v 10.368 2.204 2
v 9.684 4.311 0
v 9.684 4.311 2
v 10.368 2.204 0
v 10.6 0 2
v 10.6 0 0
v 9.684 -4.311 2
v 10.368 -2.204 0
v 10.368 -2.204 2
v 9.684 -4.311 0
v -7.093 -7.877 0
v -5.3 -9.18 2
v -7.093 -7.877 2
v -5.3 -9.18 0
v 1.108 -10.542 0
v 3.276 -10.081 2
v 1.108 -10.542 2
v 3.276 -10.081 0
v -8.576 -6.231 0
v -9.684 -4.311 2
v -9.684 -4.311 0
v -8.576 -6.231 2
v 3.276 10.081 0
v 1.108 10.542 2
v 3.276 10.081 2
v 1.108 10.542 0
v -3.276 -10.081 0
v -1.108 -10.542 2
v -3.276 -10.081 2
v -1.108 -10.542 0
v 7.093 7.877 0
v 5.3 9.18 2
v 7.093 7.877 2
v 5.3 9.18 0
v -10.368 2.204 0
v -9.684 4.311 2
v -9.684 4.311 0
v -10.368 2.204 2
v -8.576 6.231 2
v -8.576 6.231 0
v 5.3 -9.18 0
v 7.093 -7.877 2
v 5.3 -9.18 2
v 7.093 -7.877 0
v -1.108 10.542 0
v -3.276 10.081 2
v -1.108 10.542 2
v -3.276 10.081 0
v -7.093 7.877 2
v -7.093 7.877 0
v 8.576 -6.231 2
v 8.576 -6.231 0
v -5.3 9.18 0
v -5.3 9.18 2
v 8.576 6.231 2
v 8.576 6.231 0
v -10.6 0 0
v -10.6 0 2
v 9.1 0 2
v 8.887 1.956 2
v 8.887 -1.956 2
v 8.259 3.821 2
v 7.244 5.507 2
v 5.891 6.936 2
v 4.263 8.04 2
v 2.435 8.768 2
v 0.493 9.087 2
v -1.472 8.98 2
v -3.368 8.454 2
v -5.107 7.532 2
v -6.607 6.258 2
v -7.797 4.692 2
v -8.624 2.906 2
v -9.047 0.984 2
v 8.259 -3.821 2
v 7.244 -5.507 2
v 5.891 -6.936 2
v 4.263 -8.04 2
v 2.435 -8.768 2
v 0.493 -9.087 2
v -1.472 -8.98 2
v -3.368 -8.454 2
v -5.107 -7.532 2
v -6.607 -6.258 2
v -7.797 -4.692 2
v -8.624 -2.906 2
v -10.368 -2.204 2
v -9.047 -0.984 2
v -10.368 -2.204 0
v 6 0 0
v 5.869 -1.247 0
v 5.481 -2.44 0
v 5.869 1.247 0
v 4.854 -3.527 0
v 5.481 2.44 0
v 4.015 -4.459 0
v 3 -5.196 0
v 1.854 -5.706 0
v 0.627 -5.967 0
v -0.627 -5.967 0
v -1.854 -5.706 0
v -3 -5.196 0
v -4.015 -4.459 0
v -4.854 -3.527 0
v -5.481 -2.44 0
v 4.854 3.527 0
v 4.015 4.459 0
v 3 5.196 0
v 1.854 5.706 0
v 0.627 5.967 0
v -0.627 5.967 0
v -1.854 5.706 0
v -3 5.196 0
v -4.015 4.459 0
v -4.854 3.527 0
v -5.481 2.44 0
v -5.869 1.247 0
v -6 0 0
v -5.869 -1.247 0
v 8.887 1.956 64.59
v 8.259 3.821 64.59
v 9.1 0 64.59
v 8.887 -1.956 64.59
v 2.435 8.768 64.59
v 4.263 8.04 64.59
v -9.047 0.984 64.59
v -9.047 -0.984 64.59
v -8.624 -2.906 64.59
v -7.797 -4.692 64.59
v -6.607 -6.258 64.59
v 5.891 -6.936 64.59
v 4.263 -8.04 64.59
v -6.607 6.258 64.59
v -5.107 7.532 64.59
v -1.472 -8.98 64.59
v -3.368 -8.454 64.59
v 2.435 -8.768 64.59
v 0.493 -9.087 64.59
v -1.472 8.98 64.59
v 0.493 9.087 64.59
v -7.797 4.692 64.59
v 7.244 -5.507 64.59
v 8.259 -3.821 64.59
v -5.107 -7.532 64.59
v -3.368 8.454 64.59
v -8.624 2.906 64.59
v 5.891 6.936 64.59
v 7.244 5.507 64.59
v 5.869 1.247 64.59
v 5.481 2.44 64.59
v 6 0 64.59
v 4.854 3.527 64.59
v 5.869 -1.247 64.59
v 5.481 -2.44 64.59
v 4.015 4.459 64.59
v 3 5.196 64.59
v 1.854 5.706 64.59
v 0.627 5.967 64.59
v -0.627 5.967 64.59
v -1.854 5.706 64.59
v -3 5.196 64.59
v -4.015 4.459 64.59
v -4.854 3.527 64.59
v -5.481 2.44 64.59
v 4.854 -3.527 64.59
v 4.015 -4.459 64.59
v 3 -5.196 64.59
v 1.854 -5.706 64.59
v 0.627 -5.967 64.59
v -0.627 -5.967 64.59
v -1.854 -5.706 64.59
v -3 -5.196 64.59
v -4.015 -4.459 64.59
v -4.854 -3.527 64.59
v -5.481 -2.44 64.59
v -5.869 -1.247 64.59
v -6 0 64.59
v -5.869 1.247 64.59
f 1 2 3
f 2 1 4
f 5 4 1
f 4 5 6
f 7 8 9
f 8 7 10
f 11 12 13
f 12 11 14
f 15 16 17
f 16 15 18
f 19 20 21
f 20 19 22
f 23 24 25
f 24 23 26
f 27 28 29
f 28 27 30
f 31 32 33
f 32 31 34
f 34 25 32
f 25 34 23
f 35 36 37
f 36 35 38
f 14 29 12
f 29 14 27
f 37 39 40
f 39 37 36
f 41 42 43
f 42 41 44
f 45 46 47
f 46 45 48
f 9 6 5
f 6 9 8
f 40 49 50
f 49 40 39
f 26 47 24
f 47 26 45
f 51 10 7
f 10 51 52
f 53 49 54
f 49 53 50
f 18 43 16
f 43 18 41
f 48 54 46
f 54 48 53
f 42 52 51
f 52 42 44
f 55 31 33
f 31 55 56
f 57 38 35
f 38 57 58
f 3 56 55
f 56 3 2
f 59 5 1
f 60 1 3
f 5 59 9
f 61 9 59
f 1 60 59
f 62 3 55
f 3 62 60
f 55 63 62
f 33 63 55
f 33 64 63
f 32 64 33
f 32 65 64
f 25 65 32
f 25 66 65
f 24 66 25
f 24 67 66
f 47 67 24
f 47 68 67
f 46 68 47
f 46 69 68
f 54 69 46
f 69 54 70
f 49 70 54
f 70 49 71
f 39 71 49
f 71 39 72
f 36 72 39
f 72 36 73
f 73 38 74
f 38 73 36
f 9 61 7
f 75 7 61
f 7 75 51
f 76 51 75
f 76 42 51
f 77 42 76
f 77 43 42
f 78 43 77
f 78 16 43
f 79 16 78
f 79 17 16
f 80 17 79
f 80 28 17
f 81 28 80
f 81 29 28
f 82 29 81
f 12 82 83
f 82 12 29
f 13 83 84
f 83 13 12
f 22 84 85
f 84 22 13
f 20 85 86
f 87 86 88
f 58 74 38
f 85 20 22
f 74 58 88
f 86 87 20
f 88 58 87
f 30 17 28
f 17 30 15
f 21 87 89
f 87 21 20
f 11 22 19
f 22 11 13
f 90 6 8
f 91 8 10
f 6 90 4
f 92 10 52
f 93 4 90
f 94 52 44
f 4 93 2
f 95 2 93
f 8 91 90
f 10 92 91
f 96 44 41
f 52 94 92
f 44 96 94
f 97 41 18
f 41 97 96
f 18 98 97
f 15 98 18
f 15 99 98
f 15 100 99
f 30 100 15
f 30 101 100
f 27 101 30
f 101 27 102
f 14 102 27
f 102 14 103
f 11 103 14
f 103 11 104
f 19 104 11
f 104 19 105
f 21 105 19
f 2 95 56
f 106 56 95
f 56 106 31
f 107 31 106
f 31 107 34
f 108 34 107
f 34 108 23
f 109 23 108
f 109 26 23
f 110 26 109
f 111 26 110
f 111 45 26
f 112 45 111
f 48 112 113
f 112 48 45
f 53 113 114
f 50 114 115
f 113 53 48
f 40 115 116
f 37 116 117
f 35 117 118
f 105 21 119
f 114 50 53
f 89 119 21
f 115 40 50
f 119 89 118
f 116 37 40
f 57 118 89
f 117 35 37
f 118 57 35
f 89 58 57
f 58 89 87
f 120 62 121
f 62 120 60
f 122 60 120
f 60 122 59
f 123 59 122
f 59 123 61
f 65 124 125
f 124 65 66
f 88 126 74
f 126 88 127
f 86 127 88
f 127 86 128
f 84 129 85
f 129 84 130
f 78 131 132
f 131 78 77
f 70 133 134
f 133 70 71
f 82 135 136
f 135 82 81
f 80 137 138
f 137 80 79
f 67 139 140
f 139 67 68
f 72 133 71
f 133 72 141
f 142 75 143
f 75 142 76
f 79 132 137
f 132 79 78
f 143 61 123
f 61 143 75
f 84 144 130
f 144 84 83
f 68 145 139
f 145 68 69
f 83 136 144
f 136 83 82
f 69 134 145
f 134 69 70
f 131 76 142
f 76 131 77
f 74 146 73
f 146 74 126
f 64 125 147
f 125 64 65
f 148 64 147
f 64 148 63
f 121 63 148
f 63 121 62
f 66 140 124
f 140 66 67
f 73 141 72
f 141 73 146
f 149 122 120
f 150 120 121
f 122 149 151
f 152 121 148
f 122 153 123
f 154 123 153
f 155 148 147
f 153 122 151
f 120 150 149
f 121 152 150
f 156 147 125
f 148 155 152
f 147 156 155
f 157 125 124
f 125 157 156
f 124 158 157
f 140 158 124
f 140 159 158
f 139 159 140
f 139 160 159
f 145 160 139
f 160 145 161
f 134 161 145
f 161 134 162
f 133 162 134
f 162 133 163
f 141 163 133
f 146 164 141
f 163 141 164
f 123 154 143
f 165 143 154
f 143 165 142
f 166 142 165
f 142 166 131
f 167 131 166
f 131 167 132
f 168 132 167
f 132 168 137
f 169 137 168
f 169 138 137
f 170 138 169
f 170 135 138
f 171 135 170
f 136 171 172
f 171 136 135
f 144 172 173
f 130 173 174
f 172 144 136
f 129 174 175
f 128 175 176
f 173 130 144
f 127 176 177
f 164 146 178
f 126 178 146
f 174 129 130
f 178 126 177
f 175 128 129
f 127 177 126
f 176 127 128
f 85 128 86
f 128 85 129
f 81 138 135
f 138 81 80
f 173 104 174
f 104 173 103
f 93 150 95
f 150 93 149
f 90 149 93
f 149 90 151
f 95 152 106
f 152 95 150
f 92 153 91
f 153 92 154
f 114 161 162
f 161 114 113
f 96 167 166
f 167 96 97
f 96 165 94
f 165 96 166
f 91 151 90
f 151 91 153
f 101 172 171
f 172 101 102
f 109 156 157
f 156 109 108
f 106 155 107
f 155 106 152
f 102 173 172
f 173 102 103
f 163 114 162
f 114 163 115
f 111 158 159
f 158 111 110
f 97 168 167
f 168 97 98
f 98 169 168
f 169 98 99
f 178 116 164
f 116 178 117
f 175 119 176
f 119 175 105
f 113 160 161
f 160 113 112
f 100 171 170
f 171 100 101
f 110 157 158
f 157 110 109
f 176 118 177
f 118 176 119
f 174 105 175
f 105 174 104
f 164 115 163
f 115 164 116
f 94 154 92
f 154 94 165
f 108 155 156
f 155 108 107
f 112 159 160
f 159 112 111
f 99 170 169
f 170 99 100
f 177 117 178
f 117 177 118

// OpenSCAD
outer_dim=18.2;
probe_dim=12;
rim_dim=outer_dim+3;

length=8.31 + 56.28;

difference() {
  union() {
    cylinder(r=rim_dim/2, h=2);
    cylinder(r=outer_dim/2, h=length);
  }
  cylinder(r=probe_dim/2, h=length, $fs=0.1);
}
